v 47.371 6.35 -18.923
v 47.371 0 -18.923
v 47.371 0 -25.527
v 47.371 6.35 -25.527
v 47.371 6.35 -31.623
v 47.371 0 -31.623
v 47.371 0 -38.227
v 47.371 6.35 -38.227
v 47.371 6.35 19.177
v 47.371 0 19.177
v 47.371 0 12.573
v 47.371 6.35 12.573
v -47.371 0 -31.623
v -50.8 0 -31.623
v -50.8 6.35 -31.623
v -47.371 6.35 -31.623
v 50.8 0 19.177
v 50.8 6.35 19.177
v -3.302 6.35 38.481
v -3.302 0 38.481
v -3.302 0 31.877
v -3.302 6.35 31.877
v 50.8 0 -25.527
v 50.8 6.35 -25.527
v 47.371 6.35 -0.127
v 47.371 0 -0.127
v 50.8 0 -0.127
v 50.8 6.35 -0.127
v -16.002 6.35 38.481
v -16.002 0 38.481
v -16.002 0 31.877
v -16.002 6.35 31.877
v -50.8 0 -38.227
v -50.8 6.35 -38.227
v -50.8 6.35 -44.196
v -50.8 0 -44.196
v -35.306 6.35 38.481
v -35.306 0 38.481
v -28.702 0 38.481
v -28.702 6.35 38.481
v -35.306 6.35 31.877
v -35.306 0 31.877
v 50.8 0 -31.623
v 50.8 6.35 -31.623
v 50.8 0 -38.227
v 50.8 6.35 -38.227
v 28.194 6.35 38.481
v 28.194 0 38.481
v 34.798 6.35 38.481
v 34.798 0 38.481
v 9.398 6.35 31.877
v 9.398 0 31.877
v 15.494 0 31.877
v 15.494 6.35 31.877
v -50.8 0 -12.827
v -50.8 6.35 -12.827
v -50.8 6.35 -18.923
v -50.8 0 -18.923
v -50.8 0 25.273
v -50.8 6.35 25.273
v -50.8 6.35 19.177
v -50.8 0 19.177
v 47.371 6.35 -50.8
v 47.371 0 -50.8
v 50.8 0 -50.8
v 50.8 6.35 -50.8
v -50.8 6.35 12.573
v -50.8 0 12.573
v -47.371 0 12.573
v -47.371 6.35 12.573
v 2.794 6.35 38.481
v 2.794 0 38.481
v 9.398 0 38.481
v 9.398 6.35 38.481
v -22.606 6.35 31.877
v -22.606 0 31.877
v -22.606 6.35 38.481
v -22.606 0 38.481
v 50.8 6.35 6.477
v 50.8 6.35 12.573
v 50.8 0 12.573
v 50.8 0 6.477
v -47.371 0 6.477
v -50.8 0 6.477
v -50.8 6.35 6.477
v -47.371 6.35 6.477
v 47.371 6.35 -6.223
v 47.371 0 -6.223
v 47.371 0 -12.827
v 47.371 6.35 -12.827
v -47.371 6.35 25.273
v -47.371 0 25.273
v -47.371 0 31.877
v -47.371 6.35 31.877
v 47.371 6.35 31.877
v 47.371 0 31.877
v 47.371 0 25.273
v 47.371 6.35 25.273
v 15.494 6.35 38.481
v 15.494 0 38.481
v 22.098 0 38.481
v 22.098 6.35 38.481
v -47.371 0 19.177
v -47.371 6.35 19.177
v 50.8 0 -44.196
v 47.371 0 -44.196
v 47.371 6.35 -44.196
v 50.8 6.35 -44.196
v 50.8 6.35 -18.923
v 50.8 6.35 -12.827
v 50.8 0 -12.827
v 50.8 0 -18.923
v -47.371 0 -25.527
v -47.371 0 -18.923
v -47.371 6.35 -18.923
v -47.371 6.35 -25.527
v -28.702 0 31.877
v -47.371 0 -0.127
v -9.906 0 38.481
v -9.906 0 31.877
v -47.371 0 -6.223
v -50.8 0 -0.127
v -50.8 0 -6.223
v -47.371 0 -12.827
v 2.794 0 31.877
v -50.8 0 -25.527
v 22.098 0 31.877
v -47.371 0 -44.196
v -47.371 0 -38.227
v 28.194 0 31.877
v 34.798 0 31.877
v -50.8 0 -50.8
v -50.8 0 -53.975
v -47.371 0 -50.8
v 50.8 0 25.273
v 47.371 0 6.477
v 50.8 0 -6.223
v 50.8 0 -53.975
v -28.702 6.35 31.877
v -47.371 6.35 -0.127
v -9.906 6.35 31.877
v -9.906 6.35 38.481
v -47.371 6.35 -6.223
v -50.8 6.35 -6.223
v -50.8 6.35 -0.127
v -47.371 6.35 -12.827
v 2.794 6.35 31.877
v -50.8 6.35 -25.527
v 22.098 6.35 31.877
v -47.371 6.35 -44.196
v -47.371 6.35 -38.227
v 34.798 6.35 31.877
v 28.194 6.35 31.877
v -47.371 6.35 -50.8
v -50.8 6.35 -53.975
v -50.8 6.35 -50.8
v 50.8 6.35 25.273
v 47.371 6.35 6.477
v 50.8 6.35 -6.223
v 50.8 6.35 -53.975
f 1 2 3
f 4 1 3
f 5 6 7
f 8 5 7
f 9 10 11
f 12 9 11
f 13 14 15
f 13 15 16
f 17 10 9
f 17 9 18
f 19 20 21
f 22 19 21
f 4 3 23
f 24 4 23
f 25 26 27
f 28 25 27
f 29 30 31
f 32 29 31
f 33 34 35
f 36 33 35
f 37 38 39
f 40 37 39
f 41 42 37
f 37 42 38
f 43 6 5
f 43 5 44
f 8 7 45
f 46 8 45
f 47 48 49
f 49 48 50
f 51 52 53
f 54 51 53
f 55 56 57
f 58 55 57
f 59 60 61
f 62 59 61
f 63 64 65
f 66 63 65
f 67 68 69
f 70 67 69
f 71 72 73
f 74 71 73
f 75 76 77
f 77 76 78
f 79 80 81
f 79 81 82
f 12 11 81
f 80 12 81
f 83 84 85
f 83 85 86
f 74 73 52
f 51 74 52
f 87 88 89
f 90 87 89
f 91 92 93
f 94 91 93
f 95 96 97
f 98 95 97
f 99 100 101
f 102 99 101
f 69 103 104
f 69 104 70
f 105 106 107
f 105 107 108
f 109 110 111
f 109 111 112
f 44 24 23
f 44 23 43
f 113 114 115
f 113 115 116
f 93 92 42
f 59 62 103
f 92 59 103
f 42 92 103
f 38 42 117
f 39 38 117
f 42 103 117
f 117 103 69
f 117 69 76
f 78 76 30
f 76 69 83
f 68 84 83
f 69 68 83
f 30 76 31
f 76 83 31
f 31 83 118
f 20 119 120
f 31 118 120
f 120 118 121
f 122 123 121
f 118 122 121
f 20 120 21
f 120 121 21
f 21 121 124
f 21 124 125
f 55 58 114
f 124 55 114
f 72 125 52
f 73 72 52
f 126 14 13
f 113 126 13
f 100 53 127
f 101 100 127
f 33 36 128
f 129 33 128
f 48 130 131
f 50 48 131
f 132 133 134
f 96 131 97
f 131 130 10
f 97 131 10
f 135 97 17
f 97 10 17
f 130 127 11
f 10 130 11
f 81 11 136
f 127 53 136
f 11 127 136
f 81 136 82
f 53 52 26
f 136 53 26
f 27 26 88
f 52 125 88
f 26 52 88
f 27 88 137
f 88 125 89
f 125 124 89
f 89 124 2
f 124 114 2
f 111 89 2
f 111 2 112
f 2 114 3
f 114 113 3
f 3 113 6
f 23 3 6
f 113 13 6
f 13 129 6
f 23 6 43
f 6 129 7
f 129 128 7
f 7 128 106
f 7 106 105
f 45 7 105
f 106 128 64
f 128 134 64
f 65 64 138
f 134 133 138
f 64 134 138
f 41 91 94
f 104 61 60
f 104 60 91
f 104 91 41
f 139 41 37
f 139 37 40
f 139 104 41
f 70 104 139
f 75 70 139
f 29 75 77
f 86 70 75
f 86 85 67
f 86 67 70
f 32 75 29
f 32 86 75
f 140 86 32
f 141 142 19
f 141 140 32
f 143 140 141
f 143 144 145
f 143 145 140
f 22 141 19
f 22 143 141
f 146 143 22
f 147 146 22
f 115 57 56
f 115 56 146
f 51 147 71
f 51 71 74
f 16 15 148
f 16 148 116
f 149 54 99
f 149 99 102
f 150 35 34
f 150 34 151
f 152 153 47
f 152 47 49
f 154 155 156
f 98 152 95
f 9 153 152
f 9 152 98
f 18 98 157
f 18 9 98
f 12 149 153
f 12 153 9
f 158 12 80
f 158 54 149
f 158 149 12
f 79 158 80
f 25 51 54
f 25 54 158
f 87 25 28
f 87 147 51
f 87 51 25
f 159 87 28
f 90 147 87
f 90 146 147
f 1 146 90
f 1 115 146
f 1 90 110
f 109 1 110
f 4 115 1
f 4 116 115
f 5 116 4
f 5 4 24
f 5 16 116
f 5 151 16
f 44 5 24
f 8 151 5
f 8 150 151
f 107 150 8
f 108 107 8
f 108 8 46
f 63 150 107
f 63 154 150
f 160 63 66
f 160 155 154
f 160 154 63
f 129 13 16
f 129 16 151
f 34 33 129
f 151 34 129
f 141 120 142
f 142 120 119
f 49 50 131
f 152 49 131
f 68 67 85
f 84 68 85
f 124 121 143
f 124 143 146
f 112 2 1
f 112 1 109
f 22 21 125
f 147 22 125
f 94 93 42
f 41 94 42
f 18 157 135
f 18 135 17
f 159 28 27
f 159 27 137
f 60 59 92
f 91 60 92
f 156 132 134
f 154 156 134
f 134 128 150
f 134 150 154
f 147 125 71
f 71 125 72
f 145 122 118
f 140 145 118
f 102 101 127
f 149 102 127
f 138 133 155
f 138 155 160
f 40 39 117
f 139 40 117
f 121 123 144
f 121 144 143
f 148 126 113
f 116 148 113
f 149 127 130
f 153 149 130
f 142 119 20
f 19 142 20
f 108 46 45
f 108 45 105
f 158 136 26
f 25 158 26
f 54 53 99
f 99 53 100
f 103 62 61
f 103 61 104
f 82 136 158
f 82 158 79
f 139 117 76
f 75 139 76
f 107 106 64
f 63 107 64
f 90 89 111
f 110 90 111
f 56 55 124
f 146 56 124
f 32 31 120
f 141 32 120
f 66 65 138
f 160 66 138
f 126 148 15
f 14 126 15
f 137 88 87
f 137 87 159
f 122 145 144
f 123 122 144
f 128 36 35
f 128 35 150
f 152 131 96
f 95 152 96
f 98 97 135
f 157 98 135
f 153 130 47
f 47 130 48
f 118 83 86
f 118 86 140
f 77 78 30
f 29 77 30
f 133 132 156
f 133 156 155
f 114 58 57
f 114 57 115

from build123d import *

# Parameters (mm, degrees)
SKETCH1_W               = 101.6
SKETCH1_H               = 107.95
BOSS_EXTRUDE1_DEPTH     = 6.35
CUT_EXTRUDE1_DEPTH      = 75.392628163
CUT_EXTRUDE1_DEPTH_BACK = 75.392628163
SKETCH2_W               = 3.429
SKETCH2_H               = 6.604


with BuildPart() as part:
    # Sketch1 → Boss-Extrude1 (new body)
    with BuildSketch(Plane(origin=(0, 0, 0), x_dir=(1, 0, 0), z_dir=(0, 1, 0))):
        Rectangle(SKETCH1_W, SKETCH1_H)
    extrude(amount=BOSS_EXTRUDE1_DEPTH)

    # Sketch2 → Cut-Extrude1 (cut, two sides: drawn at the far end of the back side and taken through both)
    with BuildSketch(Plane(origin=(0, 6.35, 0), x_dir=(1, 0, 0), z_dir=(0, 1, 0)).offset(-CUT_EXTRUDE1_DEPTH_BACK)):
        Polygon((22.098, -31.877), (28.194, -31.877), (28.194, -38.481), (34.798, -38.481), (34.798, -31.877), (47.371, -31.877), (47.371, -25.273), (50.8, -25.273), (50.8, -31.877), (50.8, -53.975), (-50.8, -53.975), (-50.8, -31.877), (-50.8, -25.273), (-47.371, -25.273), (-47.371, -31.877), (-35.306, -31.877), (-35.306, -38.481), (-28.702, -38.481), (-28.702, -31.877), (-22.606, -31.877), (-22.606, -38.481), (-16.002, -38.481), (-16.002, -31.877), (-9.906, -31.877), (-9.906, -38.481), (-3.302, -38.481), (-3.302, -31.877), (2.794, -31.877), (2.794, -38.481), (9.398, -38.481), (9.398, -31.877), (15.494, -31.877), (15.494, -38.481), (22.098, -38.481), align=None)
        with Locations((-49.0855, 47.498)):
            Rectangle(SKETCH2_W, SKETCH2_H)
        with Locations((-49.0855, 34.925)):
            Rectangle(SKETCH2_W, SKETCH2_H)
        with Locations((-49.0855, 22.225)):
            Rectangle(SKETCH2_W, SKETCH2_H)
        with Locations((-49.0855, 9.525)):
            Rectangle(SKETCH2_W, SKETCH2_H)
        with Locations((-49.0855, -3.175)):
            Rectangle(SKETCH2_W, SKETCH2_H)
        with Locations((-49.0855, -15.875)):
            Rectangle(SKETCH2_W, SKETCH2_H)
        with Locations((49.0855, -15.875)):
            Rectangle(SKETCH2_W, SKETCH2_H)
        with Locations((49.0855, -3.175)):
            Rectangle(SKETCH2_W, SKETCH2_H)
        with Locations((49.0855, 9.525)):
            Rectangle(SKETCH2_W, SKETCH2_H)
        with Locations((49.0855, 22.225)):
            Rectangle(SKETCH2_W, SKETCH2_H)
        with Locations((49.0855, 34.925)):
            Rectangle(SKETCH2_W, SKETCH2_H)
        with Locations((49.0855, 47.498)):
            Rectangle(SKETCH2_W, SKETCH2_H)
    extrude(amount=CUT_EXTRUDE1_DEPTH + CUT_EXTRUDE1_DEPTH_BACK, mode=Mode.SUBTRACT)


solid = part.part
